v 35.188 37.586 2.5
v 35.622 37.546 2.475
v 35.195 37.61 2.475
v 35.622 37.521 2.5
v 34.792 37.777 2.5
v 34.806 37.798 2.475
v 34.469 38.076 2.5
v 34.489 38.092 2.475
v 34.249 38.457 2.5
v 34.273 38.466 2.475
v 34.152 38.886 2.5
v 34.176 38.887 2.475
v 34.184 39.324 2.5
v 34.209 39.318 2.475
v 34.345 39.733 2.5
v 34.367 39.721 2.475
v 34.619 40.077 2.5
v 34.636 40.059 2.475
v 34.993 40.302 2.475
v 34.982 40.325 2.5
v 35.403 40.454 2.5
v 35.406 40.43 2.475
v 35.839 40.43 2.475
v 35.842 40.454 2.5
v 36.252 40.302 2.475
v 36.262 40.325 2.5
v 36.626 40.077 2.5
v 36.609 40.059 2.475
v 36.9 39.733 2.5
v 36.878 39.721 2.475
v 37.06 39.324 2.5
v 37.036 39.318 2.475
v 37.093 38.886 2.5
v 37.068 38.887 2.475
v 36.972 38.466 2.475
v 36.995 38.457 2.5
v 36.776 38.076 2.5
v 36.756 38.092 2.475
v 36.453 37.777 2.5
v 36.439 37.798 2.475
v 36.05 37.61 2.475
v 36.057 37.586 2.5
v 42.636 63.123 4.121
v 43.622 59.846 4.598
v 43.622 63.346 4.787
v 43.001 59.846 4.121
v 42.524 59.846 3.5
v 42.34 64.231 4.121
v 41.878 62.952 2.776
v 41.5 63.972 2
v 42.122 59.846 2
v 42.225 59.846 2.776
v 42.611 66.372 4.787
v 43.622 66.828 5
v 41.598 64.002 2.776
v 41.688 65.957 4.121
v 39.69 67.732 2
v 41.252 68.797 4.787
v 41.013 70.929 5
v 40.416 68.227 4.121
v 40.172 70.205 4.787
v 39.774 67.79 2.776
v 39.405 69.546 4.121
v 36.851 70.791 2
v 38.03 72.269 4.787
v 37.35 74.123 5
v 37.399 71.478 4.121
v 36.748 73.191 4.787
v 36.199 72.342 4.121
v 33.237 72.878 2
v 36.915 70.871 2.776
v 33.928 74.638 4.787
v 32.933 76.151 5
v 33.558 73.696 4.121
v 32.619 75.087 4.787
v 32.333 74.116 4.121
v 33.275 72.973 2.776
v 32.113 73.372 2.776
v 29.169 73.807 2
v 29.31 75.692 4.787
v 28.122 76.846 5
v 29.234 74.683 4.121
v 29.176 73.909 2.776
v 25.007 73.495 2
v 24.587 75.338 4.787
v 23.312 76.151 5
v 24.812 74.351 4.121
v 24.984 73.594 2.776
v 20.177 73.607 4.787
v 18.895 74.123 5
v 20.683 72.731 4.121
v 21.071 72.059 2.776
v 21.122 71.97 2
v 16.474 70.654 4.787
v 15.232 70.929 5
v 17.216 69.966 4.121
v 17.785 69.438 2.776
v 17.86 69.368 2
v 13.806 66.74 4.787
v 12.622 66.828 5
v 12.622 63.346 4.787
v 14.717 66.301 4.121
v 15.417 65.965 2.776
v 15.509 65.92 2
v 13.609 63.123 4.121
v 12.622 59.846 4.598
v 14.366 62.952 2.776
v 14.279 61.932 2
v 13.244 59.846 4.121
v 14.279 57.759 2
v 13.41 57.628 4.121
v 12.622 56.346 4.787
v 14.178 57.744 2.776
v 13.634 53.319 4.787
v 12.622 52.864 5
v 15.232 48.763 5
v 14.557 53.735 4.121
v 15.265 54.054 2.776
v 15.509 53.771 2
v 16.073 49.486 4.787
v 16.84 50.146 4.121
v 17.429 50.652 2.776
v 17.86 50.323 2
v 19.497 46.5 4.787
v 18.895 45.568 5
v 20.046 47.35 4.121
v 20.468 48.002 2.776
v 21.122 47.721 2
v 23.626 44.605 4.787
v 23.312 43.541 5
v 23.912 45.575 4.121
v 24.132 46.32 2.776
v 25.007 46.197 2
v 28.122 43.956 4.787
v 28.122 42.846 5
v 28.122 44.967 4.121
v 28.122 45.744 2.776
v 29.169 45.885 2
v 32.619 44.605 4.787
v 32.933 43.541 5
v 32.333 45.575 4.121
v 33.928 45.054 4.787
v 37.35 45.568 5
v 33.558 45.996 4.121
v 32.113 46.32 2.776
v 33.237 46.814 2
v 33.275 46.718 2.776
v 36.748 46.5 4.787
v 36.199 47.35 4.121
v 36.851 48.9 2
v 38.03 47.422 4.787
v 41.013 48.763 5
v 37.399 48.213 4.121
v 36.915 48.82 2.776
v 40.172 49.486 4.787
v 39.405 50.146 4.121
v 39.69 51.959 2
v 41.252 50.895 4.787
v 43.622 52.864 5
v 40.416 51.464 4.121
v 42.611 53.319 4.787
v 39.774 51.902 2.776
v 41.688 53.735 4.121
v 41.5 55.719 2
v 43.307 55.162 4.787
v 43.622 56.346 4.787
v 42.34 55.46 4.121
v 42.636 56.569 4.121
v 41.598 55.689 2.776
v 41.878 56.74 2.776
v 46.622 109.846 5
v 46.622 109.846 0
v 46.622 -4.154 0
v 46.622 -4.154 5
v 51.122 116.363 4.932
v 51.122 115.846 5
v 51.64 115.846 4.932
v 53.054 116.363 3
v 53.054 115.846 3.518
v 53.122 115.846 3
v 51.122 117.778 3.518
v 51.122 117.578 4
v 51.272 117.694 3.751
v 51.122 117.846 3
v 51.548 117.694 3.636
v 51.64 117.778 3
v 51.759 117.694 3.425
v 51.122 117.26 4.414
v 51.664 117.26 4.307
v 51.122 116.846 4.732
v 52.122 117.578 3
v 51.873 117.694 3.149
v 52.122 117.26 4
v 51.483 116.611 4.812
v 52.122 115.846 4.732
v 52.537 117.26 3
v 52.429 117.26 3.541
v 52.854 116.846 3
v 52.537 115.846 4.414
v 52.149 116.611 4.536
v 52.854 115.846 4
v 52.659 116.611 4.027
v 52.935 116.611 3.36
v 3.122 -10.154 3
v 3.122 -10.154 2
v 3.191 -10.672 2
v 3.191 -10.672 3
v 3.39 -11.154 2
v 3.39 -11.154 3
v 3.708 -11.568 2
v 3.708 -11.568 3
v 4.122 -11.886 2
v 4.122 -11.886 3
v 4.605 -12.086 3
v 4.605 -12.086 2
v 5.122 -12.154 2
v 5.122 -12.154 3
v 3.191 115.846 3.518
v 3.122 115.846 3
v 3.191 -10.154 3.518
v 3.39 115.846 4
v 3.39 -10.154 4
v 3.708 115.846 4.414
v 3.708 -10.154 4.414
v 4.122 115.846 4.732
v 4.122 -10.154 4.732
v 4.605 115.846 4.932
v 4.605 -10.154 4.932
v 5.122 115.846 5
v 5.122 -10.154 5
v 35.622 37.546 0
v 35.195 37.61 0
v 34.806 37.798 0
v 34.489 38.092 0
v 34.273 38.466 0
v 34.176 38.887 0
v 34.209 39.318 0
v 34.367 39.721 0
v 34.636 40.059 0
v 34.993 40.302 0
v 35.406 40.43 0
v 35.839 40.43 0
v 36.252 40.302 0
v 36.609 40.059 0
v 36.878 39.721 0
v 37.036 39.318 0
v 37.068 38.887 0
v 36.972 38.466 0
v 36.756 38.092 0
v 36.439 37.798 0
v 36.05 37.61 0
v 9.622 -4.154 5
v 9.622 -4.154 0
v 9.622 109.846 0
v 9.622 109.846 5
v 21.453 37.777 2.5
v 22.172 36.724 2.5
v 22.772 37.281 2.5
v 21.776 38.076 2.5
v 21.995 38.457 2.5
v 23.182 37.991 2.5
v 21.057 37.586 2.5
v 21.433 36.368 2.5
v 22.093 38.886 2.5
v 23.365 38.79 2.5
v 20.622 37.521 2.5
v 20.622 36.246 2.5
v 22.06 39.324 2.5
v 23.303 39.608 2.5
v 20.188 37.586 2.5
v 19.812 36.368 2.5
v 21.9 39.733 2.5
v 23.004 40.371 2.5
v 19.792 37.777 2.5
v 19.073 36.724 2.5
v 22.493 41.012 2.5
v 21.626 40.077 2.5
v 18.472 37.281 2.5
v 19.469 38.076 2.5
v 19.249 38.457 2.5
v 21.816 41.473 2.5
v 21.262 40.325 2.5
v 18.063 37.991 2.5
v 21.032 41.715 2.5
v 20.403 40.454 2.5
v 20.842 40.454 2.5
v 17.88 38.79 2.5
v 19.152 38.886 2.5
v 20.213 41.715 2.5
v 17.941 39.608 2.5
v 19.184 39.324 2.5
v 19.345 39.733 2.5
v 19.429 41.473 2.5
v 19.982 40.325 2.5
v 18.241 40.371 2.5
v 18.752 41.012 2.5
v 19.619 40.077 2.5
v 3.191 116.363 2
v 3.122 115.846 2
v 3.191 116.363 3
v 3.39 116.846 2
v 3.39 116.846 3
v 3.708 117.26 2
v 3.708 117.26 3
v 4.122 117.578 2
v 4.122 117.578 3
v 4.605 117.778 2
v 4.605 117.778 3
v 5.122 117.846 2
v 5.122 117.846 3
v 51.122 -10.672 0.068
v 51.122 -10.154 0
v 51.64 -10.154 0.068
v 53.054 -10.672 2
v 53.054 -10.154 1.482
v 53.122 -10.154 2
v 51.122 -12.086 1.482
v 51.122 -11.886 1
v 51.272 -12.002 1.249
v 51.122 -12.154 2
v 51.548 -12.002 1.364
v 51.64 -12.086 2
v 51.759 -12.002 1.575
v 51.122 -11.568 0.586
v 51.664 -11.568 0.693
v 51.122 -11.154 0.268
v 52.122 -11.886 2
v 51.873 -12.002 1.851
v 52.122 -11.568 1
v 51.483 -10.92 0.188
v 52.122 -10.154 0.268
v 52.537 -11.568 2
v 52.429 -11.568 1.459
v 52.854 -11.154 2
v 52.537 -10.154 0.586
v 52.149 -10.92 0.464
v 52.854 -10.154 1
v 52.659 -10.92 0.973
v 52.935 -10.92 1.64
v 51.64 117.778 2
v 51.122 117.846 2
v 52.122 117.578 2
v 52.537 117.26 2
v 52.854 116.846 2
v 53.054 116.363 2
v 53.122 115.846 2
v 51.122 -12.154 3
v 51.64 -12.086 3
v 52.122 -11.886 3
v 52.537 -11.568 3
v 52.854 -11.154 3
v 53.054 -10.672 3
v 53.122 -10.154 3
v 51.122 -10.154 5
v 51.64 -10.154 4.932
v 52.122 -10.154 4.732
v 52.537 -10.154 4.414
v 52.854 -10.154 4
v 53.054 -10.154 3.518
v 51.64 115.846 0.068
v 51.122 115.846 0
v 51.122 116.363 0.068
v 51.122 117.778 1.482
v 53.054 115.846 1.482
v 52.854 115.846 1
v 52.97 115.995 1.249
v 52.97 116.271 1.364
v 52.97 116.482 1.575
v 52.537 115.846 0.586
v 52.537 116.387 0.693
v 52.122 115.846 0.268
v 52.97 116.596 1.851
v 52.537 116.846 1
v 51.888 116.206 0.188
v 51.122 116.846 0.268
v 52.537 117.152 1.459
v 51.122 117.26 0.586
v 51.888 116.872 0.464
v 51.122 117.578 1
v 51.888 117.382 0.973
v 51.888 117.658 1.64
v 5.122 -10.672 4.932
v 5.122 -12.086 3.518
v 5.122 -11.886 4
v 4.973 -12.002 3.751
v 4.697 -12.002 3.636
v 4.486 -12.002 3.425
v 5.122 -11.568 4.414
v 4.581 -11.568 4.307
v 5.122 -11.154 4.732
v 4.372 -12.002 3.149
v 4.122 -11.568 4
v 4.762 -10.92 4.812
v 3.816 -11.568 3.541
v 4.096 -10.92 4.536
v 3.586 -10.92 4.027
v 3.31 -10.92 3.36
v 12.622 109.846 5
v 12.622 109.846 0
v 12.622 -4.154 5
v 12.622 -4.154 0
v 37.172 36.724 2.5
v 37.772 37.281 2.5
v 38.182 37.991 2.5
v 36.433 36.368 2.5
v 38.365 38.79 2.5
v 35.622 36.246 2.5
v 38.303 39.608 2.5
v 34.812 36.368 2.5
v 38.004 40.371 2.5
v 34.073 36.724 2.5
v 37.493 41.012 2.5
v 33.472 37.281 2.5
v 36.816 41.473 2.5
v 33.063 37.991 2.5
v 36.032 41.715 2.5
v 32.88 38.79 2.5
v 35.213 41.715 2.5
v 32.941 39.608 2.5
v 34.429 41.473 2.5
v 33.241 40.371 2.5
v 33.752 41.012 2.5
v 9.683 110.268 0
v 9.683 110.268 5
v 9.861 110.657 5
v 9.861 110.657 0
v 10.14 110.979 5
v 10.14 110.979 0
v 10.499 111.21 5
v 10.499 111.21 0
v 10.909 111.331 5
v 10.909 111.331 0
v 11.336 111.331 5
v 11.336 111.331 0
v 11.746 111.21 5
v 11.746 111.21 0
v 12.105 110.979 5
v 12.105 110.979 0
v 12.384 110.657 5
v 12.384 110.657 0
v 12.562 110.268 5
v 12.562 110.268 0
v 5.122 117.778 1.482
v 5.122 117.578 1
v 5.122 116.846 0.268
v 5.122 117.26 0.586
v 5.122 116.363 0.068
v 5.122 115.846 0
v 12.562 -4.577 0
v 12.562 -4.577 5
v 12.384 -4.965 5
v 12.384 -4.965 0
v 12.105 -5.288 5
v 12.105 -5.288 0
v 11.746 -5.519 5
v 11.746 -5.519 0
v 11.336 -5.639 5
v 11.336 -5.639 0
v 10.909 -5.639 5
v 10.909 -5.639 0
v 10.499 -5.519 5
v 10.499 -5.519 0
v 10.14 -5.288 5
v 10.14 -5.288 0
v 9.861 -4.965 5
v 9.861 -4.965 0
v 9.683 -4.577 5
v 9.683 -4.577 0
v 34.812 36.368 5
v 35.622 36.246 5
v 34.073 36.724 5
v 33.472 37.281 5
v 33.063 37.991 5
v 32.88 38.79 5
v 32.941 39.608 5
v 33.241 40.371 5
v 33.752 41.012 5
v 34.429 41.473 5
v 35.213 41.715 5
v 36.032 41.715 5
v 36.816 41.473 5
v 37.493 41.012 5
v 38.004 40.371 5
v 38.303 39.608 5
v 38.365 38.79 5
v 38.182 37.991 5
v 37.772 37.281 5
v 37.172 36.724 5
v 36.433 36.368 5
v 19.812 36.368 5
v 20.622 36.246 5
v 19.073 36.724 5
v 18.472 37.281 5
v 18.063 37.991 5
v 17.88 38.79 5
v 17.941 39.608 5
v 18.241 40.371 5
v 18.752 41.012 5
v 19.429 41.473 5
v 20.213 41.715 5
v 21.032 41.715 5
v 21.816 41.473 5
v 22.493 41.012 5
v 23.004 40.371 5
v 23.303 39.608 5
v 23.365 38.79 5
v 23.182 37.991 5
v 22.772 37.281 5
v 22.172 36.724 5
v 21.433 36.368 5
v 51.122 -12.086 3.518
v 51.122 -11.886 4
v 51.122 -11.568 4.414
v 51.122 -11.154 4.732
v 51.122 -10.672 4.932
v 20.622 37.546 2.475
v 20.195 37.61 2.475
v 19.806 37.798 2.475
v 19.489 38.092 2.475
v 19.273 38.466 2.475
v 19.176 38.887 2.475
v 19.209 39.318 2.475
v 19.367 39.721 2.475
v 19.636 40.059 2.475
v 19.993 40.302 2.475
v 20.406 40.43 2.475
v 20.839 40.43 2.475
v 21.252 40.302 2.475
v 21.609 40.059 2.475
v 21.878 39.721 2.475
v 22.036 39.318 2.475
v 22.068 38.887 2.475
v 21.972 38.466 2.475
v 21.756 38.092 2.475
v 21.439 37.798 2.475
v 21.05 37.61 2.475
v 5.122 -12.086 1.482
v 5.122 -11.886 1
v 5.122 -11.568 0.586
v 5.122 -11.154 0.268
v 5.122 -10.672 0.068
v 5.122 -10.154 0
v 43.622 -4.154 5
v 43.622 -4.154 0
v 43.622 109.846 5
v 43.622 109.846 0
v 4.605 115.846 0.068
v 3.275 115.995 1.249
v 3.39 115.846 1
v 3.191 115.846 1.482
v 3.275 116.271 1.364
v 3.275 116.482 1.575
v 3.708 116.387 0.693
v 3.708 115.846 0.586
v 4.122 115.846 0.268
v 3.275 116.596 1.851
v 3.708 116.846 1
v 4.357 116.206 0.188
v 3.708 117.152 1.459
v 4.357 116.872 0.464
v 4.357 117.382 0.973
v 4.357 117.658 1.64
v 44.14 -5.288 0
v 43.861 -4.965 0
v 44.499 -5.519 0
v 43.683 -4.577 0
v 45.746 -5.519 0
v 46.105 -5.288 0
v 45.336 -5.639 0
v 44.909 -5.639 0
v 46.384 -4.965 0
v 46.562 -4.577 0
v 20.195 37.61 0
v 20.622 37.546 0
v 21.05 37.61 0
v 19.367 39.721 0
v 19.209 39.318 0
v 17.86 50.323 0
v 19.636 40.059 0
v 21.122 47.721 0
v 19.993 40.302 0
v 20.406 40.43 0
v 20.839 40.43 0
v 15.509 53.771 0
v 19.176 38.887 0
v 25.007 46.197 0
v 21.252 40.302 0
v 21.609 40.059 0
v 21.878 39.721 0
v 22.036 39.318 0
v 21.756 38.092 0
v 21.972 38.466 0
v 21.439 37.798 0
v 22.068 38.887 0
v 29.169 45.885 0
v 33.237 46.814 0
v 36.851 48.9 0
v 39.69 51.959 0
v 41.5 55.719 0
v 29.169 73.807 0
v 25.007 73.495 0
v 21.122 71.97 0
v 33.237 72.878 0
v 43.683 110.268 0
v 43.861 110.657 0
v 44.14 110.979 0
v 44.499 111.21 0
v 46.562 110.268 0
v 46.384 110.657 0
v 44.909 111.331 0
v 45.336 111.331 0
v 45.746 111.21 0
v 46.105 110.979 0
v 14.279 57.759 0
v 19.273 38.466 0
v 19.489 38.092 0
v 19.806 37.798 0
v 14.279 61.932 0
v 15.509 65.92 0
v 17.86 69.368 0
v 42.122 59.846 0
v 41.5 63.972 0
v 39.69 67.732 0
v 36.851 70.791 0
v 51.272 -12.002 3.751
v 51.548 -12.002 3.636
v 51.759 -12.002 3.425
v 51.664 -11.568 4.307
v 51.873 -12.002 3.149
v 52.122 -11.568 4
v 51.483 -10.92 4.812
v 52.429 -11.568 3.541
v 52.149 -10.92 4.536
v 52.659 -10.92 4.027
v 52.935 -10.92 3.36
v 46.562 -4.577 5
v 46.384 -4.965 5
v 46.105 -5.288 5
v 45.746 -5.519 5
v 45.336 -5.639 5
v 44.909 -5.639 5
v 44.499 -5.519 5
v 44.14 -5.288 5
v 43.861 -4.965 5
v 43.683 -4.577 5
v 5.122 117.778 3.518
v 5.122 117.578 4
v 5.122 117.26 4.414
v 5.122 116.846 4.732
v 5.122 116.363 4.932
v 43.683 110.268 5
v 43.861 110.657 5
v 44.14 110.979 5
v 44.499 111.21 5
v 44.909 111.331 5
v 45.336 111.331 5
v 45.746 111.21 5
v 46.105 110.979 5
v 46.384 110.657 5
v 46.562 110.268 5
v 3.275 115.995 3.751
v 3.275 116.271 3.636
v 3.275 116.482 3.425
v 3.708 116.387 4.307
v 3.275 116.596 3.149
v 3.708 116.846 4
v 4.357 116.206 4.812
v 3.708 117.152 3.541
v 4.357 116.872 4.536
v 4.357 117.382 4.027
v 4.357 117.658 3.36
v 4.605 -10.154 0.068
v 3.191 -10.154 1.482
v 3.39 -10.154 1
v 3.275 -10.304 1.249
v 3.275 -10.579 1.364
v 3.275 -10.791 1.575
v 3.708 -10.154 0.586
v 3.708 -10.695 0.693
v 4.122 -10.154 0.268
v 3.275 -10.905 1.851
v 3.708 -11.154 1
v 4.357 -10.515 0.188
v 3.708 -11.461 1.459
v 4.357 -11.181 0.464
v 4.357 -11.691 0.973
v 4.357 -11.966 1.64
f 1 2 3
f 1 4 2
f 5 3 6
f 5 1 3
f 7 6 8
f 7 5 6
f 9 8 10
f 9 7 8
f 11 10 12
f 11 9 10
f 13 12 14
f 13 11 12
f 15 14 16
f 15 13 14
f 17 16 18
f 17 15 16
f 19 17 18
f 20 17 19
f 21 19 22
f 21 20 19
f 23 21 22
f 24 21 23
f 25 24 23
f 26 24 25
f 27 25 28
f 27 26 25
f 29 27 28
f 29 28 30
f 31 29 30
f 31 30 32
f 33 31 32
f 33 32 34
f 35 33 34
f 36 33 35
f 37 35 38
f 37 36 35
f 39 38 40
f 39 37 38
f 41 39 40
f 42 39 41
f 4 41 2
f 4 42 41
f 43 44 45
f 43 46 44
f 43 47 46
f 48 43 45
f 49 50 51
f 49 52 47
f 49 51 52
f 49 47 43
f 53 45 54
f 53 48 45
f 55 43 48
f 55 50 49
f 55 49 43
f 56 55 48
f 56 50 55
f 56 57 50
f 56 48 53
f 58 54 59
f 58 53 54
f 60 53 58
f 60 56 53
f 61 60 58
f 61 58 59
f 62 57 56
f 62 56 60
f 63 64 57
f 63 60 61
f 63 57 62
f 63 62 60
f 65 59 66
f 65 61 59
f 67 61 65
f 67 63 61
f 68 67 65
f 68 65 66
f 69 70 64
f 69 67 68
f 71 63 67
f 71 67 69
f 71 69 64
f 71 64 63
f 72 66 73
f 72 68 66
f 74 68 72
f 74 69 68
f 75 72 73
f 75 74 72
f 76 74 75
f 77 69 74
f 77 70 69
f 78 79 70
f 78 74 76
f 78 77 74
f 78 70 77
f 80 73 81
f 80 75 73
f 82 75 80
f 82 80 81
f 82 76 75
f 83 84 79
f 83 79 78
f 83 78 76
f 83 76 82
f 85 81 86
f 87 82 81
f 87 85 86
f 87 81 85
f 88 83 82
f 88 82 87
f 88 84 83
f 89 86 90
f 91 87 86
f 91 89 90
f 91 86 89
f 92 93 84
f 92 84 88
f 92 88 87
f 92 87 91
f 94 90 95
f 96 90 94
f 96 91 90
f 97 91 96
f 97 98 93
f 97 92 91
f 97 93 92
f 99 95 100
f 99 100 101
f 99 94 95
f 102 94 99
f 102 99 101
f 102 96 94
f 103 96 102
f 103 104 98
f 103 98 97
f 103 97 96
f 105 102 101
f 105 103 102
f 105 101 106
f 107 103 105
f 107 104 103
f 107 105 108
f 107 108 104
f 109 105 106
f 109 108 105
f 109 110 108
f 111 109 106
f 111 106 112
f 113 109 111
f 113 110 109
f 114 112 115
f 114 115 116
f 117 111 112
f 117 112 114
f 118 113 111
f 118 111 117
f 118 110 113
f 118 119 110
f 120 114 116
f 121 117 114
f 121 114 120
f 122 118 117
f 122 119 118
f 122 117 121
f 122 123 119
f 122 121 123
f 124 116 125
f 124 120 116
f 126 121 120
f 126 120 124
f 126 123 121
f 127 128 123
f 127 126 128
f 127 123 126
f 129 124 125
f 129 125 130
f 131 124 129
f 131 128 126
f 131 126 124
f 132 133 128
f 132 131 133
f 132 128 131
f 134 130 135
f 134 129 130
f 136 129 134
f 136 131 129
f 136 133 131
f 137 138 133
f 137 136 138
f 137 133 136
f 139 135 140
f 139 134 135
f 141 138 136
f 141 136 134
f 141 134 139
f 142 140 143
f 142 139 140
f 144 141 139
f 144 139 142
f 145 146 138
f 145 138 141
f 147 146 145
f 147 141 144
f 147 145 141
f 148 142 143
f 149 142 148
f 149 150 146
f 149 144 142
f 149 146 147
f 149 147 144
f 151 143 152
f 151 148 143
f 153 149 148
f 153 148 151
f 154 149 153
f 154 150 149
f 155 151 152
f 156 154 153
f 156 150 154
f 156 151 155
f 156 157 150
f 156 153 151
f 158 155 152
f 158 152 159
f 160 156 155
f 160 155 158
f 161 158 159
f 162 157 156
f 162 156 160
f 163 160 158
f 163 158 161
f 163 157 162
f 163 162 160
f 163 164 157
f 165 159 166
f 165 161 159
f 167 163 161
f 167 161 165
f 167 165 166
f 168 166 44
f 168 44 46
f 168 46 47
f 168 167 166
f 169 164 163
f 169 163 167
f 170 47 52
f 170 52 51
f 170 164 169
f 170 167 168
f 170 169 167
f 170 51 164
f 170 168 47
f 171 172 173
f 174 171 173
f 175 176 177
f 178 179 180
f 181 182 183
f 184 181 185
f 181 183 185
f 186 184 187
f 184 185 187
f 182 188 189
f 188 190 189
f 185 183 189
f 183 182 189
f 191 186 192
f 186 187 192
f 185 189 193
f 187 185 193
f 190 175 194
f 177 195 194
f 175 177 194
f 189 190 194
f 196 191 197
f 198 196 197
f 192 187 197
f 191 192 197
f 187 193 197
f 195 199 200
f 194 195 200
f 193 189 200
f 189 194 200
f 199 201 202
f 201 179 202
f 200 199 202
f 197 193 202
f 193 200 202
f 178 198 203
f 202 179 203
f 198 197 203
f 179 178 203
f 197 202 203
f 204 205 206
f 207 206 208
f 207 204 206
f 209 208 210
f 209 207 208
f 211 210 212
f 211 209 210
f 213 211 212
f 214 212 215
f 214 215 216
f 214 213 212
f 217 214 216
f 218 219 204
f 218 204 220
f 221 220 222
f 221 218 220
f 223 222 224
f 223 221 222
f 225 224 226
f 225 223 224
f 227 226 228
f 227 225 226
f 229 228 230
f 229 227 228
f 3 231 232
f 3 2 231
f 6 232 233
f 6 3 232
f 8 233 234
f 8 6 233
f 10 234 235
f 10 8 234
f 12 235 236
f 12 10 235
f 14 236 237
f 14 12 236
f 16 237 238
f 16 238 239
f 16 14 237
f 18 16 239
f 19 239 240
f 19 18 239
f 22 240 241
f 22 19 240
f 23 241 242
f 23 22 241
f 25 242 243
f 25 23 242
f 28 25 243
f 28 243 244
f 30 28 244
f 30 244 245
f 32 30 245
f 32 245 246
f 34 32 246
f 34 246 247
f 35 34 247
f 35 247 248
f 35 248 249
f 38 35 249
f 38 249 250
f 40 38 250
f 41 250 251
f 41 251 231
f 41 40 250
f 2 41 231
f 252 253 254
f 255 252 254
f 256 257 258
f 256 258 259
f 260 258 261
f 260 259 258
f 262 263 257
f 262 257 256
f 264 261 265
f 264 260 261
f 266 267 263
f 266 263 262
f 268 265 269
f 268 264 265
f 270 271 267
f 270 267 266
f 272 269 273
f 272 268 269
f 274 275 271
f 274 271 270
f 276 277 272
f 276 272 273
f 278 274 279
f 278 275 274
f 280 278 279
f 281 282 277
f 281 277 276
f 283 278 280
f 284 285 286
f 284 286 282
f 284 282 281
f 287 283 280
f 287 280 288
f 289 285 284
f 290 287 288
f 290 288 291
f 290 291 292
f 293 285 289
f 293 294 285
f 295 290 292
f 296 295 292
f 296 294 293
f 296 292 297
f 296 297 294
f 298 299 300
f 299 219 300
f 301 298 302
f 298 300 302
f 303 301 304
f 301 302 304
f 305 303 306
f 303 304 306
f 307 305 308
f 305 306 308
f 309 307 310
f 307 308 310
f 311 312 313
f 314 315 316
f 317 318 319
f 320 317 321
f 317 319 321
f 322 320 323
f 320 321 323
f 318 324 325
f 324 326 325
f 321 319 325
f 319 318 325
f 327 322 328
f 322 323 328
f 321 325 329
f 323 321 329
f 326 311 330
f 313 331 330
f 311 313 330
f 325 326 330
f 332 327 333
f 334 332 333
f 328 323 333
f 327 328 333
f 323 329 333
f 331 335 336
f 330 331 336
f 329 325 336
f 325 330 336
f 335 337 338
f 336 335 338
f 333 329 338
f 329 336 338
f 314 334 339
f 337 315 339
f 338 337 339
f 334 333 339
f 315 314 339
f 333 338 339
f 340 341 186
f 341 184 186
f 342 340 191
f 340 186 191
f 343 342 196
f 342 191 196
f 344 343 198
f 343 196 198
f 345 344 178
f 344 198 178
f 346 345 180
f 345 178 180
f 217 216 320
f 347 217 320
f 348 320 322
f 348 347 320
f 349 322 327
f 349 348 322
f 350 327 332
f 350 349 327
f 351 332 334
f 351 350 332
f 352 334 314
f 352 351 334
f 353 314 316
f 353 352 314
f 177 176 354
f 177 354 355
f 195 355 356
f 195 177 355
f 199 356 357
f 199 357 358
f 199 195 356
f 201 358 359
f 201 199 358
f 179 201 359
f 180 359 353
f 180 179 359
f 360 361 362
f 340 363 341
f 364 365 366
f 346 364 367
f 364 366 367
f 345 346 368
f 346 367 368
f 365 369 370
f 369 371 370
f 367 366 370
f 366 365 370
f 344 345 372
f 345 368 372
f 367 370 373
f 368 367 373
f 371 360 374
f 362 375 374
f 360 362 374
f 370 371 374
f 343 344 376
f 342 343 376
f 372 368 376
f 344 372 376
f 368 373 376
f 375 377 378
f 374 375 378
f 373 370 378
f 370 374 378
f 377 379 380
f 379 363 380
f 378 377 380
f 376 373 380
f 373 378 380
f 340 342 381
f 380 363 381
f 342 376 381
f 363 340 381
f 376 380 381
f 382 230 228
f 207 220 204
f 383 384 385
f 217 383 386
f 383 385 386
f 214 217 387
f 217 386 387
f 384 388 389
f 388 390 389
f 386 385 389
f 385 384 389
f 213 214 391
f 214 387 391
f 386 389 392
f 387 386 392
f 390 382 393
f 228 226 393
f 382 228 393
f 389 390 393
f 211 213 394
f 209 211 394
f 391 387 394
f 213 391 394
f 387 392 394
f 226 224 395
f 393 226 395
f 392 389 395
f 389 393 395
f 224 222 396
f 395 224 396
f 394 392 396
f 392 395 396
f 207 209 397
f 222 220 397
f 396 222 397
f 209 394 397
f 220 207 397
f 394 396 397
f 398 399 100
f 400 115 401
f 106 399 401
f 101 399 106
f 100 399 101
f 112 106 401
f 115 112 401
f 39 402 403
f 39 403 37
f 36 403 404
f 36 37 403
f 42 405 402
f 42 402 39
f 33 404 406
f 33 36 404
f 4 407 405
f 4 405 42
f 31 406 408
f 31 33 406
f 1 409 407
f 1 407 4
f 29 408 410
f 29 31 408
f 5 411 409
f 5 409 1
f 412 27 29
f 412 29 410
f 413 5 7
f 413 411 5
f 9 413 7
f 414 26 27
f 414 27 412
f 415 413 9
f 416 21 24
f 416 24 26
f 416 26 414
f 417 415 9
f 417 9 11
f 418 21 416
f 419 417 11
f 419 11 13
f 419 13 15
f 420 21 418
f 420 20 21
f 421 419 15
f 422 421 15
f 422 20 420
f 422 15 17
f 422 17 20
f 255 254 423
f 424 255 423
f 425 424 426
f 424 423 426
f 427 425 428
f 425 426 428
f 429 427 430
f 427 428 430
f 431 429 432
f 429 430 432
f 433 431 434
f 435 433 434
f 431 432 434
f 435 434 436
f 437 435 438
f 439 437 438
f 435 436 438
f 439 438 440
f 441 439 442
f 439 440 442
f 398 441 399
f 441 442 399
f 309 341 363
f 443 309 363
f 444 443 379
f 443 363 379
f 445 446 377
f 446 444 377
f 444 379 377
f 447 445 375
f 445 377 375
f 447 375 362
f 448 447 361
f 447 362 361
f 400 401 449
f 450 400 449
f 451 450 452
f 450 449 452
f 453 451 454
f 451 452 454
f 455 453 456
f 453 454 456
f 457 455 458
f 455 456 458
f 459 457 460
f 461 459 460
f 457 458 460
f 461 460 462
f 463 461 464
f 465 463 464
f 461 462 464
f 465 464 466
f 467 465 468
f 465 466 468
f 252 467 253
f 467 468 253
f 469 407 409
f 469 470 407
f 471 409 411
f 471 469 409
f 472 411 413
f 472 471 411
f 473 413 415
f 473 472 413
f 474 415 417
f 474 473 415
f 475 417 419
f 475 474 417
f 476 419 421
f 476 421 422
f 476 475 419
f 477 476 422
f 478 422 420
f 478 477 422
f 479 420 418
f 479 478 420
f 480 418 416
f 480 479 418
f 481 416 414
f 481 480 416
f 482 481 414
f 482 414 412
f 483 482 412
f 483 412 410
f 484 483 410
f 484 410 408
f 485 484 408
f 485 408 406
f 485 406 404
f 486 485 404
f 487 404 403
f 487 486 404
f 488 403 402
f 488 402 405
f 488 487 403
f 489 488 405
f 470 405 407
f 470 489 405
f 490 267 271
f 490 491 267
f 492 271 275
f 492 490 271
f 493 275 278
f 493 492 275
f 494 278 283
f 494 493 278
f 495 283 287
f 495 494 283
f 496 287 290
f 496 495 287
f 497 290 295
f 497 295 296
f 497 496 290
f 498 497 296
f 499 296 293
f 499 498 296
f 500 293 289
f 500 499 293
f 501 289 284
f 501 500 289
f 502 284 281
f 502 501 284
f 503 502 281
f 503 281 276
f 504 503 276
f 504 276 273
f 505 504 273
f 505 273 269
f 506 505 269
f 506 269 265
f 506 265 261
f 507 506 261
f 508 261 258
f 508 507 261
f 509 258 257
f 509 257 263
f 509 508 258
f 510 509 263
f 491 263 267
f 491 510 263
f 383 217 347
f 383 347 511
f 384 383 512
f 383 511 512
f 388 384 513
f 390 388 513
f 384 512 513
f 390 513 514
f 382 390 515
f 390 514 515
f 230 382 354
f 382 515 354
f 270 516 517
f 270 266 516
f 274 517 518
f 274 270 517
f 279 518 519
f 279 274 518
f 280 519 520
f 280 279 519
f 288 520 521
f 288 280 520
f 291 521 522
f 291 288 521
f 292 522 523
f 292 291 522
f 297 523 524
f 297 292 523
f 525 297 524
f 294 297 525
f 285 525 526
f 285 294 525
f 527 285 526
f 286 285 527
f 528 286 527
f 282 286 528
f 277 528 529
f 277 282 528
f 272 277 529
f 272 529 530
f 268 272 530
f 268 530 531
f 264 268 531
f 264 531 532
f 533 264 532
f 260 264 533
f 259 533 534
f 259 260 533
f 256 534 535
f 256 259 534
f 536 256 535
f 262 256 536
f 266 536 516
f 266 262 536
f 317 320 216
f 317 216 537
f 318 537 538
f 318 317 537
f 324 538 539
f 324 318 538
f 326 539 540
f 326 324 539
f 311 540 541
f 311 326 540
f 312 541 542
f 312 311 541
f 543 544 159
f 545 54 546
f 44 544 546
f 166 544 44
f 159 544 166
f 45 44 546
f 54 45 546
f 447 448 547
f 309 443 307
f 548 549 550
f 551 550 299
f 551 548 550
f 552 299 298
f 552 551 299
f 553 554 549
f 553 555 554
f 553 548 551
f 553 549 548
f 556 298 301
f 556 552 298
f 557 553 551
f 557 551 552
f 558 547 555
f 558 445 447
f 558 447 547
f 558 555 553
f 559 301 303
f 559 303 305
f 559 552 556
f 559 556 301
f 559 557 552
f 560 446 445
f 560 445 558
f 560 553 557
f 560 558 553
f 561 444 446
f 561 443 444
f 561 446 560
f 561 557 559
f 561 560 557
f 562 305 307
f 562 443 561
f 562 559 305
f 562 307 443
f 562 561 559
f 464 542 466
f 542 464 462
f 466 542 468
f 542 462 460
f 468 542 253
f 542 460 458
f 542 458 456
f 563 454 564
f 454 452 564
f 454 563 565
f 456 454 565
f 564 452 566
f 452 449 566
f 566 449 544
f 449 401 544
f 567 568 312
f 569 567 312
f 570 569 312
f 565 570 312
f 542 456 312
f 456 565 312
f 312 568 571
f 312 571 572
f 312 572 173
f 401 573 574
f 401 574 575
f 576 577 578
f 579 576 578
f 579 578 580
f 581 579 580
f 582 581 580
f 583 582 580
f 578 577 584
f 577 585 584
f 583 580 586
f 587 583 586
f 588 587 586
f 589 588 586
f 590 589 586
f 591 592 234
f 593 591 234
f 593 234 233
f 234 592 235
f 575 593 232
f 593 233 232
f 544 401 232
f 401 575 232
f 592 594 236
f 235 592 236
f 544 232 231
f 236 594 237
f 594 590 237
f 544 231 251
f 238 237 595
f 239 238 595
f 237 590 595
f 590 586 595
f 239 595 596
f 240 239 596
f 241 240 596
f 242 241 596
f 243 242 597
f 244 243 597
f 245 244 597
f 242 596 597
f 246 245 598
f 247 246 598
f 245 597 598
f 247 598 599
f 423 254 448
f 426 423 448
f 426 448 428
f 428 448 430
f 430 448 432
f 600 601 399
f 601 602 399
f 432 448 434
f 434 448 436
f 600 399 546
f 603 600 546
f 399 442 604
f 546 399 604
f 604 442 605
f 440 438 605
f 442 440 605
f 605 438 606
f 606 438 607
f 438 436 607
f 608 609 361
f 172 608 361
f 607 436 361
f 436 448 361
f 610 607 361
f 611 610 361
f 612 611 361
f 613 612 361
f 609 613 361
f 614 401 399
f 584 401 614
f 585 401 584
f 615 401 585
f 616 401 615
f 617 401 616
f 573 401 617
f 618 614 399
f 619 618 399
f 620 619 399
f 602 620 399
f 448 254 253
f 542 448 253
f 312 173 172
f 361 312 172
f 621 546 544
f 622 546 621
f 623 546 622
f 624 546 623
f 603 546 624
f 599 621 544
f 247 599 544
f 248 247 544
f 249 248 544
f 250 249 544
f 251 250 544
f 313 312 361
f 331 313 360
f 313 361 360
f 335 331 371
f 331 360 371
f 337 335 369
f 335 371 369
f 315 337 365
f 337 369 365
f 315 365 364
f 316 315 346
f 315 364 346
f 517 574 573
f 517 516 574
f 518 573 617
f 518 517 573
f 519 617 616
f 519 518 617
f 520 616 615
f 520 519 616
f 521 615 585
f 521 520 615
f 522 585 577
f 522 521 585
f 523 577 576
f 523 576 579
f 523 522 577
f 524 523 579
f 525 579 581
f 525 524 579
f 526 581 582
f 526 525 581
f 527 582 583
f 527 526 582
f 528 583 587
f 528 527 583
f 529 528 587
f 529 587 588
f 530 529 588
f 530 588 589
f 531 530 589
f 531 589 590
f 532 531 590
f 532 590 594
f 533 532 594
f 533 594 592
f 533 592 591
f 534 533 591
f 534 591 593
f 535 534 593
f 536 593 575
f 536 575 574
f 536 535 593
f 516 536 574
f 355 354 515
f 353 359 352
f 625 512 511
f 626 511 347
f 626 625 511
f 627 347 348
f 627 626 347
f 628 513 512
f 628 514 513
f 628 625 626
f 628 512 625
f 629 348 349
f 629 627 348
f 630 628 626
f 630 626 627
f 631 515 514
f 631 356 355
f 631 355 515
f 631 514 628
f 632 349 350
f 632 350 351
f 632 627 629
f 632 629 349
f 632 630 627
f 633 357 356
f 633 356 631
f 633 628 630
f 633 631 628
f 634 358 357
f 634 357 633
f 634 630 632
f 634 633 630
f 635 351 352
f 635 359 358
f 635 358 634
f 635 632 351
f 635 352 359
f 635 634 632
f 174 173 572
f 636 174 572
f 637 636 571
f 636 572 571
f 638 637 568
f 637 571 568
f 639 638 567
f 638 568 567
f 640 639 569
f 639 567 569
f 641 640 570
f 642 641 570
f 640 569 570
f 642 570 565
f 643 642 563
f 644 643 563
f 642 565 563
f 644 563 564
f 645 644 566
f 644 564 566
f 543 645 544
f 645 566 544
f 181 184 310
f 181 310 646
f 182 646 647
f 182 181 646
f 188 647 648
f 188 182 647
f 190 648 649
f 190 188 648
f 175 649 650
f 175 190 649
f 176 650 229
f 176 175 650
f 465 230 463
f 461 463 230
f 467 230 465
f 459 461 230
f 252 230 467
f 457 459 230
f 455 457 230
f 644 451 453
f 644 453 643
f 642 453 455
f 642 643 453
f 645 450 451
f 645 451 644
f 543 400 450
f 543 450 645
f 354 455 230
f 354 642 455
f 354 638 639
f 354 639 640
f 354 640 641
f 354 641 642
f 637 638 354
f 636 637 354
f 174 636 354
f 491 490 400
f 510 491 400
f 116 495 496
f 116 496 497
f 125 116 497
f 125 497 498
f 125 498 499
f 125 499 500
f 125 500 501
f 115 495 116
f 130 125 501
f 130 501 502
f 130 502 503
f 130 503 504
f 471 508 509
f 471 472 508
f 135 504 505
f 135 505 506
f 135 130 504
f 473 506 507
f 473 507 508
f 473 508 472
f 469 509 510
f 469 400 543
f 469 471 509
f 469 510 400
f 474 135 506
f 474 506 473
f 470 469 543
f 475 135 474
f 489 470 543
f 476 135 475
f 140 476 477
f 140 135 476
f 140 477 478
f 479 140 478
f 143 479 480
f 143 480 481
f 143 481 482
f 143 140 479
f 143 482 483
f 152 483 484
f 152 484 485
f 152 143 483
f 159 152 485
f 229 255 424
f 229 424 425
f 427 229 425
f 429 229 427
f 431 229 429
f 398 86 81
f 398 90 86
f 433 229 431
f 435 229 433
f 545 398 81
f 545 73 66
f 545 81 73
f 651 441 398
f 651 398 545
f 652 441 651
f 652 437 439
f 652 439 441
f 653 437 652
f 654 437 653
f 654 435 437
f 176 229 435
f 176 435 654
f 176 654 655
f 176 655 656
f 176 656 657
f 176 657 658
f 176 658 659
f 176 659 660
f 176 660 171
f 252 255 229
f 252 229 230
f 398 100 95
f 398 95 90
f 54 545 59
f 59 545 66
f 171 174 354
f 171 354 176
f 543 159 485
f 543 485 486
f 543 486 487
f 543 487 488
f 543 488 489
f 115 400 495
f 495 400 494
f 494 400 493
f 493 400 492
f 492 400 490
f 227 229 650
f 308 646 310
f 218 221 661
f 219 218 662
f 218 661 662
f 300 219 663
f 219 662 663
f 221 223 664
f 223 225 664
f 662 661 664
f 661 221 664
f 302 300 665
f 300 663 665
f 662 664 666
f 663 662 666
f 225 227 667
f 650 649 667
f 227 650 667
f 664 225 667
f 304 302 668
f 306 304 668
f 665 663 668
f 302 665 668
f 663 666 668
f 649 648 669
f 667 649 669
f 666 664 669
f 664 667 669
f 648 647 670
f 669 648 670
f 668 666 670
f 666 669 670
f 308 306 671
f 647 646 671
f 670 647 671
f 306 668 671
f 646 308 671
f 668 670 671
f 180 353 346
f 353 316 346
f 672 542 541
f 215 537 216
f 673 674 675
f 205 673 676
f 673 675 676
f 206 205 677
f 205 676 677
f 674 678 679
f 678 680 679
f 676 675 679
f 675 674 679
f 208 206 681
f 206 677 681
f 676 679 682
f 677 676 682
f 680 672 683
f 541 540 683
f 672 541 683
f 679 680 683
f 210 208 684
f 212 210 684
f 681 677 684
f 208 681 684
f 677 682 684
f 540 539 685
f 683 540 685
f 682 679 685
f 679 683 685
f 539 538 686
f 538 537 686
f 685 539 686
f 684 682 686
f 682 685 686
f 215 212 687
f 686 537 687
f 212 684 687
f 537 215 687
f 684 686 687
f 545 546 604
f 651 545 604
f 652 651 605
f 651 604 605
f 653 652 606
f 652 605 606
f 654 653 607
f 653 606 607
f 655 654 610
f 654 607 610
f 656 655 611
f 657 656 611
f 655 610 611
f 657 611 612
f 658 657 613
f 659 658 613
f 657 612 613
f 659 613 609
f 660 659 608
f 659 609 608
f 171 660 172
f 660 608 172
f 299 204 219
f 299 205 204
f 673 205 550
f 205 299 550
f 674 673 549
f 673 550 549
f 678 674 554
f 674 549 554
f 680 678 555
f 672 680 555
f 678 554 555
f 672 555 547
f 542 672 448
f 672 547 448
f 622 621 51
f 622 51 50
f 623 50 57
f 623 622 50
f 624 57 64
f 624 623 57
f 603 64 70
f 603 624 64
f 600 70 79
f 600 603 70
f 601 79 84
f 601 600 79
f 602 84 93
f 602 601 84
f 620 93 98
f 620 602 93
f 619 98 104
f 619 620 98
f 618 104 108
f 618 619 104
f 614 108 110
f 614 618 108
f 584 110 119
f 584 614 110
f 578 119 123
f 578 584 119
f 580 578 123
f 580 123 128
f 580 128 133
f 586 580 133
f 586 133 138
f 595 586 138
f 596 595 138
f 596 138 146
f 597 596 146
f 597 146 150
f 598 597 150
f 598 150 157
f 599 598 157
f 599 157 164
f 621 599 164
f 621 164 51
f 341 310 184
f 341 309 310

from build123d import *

# Parameters (mm, degrees)
BASE_W                          = 50
BASE_H                          = 130
BASE_R                          = 14
BOSS_EXTRUDE1_DEPTH             = 5
CBORE_FOR_M2_5_SHCS1_AT_2_COUNT = 2
CBORE_FOR_M2_5_SHCS1_AT_2_PITCH = 15
FILLET3_R                       = 2
FILLET5_R                       = 3


with BuildPart() as part:
    # Base → Boss-Extrude1 (new body)
    with BuildSketch(Plane.XY):
        with Locations((28.12242927, 52.845785243)):
            Rectangle(BASE_W, BASE_H)
        with Locations((28.12242927, 59.845785243)):
            Circle(BASE_R, mode=Mode.SUBTRACT)
        with BuildLine():
            Line((46.62242927, 109.845785243), (46.62242927, -4.154214757))
            ThreePointArc((46.62242927, -4.154214757), (45.12242927, -5.654214757), (43.62242927, -4.154214757))
            Line((43.62242927, -4.154214757), (43.62242927, 109.845785243))
            ThreePointArc((43.62242927, 109.845785243), (45.12242927, 111.345785243), (46.62242927, 109.845785243))
        make_face(mode=Mode.SUBTRACT)
        with BuildLine():
            Line((12.62242927, 109.845785243), (12.62242927, -4.154214757))
            ThreePointArc((12.62242927, -4.154214757), (11.12242927, -5.654214757), (9.62242927, -4.154214757))
            Line((9.62242927, -4.154214757), (9.62242927, 109.845785243))
            ThreePointArc((9.62242927, 109.845785243), (11.12242927, 111.345785243), (12.62242927, 109.845785243))
        make_face(mode=Mode.SUBTRACT)
    extrude(amount=BOSS_EXTRUDE1_DEPTH)

    # Sketch5 → CBORE for M2.5 SHCS1 (revolve, cut)
    with BuildSketch(Plane(origin=(20.62242927, 38.995785243, 5), x_dir=(0, -1, 0), z_dir=(1, 0, 0))):
        Polygon((0, 0), (0, 5), (1.45, 5), (1.45, 2.525), (1.475, 2.5), (2.75, 2.5), (2.75, 0), align=None)
    cbore_for_m2_5_shcs1 = revolve(axis=Axis((20.62242927, 38.995785243, 11.35), (0, 0, -1)), mode=Mode.SUBTRACT)

    # CBORE for M2.5 SHCS1 at 2: CBORE for M2.5 SHCS1 ×2
    with Locations(*[(i * CBORE_FOR_M2_5_SHCS1_AT_2_PITCH, 0, 0) for i in range(1, CBORE_FOR_M2_5_SHCS1_AT_2_COUNT)]):
        add(cbore_for_m2_5_shcs1, mode=Mode.SUBTRACT)

    # Fillet3
    fillet3_edges = [part.edges().sort_by_distance(p)[0] for p in [
        (53.12242927, 52.845785243, 5),
        (28.12242927, 117.845785243, 5),
        (3.12242927, 52.845785243, 5),
        (28.12242927, 117.845785243, 0),
        (53.12242927, 52.845785243, 0),
        (28.12242927, -12.154214757, 0),
        (3.12242927, 52.845785243, 0),
        (28.12242927, -12.154214757, 5),
        (3.12242927, 117.845785243, 2.5),
        (53.12242927, 117.845785243, 2.5),
        (53.12242927, -12.154214757, 2.5),
        (3.12242927, -12.154214757, 2.5),
    ]]
    fillet(fillet3_edges, radius=FILLET3_R)

    # Fillet5
    # the kernel refuses this fillet: 3 mm, written as the material it takes off along each edge
    with BuildSketch(Plane(origin=(28.12242927, 59.845785243, 5), x_dir=(1, 0, 0), z_dir=(0, -1, 0))) as fillet5_piece_1:
        with BuildLine():
            CenterArc((14 + FILLET5_R, -FILLET5_R), FILLET5_R, 90, 90)
            Line((14, -FILLET5_R), (14, 0))
            Line((14, 0), (14 + FILLET5_R, 0))
        make_face()
    revolve(axis=Axis((28.12242927, 59.845785243, 5), (0, 0, 1)), mode=Mode.SUBTRACT)


solid = part.part
